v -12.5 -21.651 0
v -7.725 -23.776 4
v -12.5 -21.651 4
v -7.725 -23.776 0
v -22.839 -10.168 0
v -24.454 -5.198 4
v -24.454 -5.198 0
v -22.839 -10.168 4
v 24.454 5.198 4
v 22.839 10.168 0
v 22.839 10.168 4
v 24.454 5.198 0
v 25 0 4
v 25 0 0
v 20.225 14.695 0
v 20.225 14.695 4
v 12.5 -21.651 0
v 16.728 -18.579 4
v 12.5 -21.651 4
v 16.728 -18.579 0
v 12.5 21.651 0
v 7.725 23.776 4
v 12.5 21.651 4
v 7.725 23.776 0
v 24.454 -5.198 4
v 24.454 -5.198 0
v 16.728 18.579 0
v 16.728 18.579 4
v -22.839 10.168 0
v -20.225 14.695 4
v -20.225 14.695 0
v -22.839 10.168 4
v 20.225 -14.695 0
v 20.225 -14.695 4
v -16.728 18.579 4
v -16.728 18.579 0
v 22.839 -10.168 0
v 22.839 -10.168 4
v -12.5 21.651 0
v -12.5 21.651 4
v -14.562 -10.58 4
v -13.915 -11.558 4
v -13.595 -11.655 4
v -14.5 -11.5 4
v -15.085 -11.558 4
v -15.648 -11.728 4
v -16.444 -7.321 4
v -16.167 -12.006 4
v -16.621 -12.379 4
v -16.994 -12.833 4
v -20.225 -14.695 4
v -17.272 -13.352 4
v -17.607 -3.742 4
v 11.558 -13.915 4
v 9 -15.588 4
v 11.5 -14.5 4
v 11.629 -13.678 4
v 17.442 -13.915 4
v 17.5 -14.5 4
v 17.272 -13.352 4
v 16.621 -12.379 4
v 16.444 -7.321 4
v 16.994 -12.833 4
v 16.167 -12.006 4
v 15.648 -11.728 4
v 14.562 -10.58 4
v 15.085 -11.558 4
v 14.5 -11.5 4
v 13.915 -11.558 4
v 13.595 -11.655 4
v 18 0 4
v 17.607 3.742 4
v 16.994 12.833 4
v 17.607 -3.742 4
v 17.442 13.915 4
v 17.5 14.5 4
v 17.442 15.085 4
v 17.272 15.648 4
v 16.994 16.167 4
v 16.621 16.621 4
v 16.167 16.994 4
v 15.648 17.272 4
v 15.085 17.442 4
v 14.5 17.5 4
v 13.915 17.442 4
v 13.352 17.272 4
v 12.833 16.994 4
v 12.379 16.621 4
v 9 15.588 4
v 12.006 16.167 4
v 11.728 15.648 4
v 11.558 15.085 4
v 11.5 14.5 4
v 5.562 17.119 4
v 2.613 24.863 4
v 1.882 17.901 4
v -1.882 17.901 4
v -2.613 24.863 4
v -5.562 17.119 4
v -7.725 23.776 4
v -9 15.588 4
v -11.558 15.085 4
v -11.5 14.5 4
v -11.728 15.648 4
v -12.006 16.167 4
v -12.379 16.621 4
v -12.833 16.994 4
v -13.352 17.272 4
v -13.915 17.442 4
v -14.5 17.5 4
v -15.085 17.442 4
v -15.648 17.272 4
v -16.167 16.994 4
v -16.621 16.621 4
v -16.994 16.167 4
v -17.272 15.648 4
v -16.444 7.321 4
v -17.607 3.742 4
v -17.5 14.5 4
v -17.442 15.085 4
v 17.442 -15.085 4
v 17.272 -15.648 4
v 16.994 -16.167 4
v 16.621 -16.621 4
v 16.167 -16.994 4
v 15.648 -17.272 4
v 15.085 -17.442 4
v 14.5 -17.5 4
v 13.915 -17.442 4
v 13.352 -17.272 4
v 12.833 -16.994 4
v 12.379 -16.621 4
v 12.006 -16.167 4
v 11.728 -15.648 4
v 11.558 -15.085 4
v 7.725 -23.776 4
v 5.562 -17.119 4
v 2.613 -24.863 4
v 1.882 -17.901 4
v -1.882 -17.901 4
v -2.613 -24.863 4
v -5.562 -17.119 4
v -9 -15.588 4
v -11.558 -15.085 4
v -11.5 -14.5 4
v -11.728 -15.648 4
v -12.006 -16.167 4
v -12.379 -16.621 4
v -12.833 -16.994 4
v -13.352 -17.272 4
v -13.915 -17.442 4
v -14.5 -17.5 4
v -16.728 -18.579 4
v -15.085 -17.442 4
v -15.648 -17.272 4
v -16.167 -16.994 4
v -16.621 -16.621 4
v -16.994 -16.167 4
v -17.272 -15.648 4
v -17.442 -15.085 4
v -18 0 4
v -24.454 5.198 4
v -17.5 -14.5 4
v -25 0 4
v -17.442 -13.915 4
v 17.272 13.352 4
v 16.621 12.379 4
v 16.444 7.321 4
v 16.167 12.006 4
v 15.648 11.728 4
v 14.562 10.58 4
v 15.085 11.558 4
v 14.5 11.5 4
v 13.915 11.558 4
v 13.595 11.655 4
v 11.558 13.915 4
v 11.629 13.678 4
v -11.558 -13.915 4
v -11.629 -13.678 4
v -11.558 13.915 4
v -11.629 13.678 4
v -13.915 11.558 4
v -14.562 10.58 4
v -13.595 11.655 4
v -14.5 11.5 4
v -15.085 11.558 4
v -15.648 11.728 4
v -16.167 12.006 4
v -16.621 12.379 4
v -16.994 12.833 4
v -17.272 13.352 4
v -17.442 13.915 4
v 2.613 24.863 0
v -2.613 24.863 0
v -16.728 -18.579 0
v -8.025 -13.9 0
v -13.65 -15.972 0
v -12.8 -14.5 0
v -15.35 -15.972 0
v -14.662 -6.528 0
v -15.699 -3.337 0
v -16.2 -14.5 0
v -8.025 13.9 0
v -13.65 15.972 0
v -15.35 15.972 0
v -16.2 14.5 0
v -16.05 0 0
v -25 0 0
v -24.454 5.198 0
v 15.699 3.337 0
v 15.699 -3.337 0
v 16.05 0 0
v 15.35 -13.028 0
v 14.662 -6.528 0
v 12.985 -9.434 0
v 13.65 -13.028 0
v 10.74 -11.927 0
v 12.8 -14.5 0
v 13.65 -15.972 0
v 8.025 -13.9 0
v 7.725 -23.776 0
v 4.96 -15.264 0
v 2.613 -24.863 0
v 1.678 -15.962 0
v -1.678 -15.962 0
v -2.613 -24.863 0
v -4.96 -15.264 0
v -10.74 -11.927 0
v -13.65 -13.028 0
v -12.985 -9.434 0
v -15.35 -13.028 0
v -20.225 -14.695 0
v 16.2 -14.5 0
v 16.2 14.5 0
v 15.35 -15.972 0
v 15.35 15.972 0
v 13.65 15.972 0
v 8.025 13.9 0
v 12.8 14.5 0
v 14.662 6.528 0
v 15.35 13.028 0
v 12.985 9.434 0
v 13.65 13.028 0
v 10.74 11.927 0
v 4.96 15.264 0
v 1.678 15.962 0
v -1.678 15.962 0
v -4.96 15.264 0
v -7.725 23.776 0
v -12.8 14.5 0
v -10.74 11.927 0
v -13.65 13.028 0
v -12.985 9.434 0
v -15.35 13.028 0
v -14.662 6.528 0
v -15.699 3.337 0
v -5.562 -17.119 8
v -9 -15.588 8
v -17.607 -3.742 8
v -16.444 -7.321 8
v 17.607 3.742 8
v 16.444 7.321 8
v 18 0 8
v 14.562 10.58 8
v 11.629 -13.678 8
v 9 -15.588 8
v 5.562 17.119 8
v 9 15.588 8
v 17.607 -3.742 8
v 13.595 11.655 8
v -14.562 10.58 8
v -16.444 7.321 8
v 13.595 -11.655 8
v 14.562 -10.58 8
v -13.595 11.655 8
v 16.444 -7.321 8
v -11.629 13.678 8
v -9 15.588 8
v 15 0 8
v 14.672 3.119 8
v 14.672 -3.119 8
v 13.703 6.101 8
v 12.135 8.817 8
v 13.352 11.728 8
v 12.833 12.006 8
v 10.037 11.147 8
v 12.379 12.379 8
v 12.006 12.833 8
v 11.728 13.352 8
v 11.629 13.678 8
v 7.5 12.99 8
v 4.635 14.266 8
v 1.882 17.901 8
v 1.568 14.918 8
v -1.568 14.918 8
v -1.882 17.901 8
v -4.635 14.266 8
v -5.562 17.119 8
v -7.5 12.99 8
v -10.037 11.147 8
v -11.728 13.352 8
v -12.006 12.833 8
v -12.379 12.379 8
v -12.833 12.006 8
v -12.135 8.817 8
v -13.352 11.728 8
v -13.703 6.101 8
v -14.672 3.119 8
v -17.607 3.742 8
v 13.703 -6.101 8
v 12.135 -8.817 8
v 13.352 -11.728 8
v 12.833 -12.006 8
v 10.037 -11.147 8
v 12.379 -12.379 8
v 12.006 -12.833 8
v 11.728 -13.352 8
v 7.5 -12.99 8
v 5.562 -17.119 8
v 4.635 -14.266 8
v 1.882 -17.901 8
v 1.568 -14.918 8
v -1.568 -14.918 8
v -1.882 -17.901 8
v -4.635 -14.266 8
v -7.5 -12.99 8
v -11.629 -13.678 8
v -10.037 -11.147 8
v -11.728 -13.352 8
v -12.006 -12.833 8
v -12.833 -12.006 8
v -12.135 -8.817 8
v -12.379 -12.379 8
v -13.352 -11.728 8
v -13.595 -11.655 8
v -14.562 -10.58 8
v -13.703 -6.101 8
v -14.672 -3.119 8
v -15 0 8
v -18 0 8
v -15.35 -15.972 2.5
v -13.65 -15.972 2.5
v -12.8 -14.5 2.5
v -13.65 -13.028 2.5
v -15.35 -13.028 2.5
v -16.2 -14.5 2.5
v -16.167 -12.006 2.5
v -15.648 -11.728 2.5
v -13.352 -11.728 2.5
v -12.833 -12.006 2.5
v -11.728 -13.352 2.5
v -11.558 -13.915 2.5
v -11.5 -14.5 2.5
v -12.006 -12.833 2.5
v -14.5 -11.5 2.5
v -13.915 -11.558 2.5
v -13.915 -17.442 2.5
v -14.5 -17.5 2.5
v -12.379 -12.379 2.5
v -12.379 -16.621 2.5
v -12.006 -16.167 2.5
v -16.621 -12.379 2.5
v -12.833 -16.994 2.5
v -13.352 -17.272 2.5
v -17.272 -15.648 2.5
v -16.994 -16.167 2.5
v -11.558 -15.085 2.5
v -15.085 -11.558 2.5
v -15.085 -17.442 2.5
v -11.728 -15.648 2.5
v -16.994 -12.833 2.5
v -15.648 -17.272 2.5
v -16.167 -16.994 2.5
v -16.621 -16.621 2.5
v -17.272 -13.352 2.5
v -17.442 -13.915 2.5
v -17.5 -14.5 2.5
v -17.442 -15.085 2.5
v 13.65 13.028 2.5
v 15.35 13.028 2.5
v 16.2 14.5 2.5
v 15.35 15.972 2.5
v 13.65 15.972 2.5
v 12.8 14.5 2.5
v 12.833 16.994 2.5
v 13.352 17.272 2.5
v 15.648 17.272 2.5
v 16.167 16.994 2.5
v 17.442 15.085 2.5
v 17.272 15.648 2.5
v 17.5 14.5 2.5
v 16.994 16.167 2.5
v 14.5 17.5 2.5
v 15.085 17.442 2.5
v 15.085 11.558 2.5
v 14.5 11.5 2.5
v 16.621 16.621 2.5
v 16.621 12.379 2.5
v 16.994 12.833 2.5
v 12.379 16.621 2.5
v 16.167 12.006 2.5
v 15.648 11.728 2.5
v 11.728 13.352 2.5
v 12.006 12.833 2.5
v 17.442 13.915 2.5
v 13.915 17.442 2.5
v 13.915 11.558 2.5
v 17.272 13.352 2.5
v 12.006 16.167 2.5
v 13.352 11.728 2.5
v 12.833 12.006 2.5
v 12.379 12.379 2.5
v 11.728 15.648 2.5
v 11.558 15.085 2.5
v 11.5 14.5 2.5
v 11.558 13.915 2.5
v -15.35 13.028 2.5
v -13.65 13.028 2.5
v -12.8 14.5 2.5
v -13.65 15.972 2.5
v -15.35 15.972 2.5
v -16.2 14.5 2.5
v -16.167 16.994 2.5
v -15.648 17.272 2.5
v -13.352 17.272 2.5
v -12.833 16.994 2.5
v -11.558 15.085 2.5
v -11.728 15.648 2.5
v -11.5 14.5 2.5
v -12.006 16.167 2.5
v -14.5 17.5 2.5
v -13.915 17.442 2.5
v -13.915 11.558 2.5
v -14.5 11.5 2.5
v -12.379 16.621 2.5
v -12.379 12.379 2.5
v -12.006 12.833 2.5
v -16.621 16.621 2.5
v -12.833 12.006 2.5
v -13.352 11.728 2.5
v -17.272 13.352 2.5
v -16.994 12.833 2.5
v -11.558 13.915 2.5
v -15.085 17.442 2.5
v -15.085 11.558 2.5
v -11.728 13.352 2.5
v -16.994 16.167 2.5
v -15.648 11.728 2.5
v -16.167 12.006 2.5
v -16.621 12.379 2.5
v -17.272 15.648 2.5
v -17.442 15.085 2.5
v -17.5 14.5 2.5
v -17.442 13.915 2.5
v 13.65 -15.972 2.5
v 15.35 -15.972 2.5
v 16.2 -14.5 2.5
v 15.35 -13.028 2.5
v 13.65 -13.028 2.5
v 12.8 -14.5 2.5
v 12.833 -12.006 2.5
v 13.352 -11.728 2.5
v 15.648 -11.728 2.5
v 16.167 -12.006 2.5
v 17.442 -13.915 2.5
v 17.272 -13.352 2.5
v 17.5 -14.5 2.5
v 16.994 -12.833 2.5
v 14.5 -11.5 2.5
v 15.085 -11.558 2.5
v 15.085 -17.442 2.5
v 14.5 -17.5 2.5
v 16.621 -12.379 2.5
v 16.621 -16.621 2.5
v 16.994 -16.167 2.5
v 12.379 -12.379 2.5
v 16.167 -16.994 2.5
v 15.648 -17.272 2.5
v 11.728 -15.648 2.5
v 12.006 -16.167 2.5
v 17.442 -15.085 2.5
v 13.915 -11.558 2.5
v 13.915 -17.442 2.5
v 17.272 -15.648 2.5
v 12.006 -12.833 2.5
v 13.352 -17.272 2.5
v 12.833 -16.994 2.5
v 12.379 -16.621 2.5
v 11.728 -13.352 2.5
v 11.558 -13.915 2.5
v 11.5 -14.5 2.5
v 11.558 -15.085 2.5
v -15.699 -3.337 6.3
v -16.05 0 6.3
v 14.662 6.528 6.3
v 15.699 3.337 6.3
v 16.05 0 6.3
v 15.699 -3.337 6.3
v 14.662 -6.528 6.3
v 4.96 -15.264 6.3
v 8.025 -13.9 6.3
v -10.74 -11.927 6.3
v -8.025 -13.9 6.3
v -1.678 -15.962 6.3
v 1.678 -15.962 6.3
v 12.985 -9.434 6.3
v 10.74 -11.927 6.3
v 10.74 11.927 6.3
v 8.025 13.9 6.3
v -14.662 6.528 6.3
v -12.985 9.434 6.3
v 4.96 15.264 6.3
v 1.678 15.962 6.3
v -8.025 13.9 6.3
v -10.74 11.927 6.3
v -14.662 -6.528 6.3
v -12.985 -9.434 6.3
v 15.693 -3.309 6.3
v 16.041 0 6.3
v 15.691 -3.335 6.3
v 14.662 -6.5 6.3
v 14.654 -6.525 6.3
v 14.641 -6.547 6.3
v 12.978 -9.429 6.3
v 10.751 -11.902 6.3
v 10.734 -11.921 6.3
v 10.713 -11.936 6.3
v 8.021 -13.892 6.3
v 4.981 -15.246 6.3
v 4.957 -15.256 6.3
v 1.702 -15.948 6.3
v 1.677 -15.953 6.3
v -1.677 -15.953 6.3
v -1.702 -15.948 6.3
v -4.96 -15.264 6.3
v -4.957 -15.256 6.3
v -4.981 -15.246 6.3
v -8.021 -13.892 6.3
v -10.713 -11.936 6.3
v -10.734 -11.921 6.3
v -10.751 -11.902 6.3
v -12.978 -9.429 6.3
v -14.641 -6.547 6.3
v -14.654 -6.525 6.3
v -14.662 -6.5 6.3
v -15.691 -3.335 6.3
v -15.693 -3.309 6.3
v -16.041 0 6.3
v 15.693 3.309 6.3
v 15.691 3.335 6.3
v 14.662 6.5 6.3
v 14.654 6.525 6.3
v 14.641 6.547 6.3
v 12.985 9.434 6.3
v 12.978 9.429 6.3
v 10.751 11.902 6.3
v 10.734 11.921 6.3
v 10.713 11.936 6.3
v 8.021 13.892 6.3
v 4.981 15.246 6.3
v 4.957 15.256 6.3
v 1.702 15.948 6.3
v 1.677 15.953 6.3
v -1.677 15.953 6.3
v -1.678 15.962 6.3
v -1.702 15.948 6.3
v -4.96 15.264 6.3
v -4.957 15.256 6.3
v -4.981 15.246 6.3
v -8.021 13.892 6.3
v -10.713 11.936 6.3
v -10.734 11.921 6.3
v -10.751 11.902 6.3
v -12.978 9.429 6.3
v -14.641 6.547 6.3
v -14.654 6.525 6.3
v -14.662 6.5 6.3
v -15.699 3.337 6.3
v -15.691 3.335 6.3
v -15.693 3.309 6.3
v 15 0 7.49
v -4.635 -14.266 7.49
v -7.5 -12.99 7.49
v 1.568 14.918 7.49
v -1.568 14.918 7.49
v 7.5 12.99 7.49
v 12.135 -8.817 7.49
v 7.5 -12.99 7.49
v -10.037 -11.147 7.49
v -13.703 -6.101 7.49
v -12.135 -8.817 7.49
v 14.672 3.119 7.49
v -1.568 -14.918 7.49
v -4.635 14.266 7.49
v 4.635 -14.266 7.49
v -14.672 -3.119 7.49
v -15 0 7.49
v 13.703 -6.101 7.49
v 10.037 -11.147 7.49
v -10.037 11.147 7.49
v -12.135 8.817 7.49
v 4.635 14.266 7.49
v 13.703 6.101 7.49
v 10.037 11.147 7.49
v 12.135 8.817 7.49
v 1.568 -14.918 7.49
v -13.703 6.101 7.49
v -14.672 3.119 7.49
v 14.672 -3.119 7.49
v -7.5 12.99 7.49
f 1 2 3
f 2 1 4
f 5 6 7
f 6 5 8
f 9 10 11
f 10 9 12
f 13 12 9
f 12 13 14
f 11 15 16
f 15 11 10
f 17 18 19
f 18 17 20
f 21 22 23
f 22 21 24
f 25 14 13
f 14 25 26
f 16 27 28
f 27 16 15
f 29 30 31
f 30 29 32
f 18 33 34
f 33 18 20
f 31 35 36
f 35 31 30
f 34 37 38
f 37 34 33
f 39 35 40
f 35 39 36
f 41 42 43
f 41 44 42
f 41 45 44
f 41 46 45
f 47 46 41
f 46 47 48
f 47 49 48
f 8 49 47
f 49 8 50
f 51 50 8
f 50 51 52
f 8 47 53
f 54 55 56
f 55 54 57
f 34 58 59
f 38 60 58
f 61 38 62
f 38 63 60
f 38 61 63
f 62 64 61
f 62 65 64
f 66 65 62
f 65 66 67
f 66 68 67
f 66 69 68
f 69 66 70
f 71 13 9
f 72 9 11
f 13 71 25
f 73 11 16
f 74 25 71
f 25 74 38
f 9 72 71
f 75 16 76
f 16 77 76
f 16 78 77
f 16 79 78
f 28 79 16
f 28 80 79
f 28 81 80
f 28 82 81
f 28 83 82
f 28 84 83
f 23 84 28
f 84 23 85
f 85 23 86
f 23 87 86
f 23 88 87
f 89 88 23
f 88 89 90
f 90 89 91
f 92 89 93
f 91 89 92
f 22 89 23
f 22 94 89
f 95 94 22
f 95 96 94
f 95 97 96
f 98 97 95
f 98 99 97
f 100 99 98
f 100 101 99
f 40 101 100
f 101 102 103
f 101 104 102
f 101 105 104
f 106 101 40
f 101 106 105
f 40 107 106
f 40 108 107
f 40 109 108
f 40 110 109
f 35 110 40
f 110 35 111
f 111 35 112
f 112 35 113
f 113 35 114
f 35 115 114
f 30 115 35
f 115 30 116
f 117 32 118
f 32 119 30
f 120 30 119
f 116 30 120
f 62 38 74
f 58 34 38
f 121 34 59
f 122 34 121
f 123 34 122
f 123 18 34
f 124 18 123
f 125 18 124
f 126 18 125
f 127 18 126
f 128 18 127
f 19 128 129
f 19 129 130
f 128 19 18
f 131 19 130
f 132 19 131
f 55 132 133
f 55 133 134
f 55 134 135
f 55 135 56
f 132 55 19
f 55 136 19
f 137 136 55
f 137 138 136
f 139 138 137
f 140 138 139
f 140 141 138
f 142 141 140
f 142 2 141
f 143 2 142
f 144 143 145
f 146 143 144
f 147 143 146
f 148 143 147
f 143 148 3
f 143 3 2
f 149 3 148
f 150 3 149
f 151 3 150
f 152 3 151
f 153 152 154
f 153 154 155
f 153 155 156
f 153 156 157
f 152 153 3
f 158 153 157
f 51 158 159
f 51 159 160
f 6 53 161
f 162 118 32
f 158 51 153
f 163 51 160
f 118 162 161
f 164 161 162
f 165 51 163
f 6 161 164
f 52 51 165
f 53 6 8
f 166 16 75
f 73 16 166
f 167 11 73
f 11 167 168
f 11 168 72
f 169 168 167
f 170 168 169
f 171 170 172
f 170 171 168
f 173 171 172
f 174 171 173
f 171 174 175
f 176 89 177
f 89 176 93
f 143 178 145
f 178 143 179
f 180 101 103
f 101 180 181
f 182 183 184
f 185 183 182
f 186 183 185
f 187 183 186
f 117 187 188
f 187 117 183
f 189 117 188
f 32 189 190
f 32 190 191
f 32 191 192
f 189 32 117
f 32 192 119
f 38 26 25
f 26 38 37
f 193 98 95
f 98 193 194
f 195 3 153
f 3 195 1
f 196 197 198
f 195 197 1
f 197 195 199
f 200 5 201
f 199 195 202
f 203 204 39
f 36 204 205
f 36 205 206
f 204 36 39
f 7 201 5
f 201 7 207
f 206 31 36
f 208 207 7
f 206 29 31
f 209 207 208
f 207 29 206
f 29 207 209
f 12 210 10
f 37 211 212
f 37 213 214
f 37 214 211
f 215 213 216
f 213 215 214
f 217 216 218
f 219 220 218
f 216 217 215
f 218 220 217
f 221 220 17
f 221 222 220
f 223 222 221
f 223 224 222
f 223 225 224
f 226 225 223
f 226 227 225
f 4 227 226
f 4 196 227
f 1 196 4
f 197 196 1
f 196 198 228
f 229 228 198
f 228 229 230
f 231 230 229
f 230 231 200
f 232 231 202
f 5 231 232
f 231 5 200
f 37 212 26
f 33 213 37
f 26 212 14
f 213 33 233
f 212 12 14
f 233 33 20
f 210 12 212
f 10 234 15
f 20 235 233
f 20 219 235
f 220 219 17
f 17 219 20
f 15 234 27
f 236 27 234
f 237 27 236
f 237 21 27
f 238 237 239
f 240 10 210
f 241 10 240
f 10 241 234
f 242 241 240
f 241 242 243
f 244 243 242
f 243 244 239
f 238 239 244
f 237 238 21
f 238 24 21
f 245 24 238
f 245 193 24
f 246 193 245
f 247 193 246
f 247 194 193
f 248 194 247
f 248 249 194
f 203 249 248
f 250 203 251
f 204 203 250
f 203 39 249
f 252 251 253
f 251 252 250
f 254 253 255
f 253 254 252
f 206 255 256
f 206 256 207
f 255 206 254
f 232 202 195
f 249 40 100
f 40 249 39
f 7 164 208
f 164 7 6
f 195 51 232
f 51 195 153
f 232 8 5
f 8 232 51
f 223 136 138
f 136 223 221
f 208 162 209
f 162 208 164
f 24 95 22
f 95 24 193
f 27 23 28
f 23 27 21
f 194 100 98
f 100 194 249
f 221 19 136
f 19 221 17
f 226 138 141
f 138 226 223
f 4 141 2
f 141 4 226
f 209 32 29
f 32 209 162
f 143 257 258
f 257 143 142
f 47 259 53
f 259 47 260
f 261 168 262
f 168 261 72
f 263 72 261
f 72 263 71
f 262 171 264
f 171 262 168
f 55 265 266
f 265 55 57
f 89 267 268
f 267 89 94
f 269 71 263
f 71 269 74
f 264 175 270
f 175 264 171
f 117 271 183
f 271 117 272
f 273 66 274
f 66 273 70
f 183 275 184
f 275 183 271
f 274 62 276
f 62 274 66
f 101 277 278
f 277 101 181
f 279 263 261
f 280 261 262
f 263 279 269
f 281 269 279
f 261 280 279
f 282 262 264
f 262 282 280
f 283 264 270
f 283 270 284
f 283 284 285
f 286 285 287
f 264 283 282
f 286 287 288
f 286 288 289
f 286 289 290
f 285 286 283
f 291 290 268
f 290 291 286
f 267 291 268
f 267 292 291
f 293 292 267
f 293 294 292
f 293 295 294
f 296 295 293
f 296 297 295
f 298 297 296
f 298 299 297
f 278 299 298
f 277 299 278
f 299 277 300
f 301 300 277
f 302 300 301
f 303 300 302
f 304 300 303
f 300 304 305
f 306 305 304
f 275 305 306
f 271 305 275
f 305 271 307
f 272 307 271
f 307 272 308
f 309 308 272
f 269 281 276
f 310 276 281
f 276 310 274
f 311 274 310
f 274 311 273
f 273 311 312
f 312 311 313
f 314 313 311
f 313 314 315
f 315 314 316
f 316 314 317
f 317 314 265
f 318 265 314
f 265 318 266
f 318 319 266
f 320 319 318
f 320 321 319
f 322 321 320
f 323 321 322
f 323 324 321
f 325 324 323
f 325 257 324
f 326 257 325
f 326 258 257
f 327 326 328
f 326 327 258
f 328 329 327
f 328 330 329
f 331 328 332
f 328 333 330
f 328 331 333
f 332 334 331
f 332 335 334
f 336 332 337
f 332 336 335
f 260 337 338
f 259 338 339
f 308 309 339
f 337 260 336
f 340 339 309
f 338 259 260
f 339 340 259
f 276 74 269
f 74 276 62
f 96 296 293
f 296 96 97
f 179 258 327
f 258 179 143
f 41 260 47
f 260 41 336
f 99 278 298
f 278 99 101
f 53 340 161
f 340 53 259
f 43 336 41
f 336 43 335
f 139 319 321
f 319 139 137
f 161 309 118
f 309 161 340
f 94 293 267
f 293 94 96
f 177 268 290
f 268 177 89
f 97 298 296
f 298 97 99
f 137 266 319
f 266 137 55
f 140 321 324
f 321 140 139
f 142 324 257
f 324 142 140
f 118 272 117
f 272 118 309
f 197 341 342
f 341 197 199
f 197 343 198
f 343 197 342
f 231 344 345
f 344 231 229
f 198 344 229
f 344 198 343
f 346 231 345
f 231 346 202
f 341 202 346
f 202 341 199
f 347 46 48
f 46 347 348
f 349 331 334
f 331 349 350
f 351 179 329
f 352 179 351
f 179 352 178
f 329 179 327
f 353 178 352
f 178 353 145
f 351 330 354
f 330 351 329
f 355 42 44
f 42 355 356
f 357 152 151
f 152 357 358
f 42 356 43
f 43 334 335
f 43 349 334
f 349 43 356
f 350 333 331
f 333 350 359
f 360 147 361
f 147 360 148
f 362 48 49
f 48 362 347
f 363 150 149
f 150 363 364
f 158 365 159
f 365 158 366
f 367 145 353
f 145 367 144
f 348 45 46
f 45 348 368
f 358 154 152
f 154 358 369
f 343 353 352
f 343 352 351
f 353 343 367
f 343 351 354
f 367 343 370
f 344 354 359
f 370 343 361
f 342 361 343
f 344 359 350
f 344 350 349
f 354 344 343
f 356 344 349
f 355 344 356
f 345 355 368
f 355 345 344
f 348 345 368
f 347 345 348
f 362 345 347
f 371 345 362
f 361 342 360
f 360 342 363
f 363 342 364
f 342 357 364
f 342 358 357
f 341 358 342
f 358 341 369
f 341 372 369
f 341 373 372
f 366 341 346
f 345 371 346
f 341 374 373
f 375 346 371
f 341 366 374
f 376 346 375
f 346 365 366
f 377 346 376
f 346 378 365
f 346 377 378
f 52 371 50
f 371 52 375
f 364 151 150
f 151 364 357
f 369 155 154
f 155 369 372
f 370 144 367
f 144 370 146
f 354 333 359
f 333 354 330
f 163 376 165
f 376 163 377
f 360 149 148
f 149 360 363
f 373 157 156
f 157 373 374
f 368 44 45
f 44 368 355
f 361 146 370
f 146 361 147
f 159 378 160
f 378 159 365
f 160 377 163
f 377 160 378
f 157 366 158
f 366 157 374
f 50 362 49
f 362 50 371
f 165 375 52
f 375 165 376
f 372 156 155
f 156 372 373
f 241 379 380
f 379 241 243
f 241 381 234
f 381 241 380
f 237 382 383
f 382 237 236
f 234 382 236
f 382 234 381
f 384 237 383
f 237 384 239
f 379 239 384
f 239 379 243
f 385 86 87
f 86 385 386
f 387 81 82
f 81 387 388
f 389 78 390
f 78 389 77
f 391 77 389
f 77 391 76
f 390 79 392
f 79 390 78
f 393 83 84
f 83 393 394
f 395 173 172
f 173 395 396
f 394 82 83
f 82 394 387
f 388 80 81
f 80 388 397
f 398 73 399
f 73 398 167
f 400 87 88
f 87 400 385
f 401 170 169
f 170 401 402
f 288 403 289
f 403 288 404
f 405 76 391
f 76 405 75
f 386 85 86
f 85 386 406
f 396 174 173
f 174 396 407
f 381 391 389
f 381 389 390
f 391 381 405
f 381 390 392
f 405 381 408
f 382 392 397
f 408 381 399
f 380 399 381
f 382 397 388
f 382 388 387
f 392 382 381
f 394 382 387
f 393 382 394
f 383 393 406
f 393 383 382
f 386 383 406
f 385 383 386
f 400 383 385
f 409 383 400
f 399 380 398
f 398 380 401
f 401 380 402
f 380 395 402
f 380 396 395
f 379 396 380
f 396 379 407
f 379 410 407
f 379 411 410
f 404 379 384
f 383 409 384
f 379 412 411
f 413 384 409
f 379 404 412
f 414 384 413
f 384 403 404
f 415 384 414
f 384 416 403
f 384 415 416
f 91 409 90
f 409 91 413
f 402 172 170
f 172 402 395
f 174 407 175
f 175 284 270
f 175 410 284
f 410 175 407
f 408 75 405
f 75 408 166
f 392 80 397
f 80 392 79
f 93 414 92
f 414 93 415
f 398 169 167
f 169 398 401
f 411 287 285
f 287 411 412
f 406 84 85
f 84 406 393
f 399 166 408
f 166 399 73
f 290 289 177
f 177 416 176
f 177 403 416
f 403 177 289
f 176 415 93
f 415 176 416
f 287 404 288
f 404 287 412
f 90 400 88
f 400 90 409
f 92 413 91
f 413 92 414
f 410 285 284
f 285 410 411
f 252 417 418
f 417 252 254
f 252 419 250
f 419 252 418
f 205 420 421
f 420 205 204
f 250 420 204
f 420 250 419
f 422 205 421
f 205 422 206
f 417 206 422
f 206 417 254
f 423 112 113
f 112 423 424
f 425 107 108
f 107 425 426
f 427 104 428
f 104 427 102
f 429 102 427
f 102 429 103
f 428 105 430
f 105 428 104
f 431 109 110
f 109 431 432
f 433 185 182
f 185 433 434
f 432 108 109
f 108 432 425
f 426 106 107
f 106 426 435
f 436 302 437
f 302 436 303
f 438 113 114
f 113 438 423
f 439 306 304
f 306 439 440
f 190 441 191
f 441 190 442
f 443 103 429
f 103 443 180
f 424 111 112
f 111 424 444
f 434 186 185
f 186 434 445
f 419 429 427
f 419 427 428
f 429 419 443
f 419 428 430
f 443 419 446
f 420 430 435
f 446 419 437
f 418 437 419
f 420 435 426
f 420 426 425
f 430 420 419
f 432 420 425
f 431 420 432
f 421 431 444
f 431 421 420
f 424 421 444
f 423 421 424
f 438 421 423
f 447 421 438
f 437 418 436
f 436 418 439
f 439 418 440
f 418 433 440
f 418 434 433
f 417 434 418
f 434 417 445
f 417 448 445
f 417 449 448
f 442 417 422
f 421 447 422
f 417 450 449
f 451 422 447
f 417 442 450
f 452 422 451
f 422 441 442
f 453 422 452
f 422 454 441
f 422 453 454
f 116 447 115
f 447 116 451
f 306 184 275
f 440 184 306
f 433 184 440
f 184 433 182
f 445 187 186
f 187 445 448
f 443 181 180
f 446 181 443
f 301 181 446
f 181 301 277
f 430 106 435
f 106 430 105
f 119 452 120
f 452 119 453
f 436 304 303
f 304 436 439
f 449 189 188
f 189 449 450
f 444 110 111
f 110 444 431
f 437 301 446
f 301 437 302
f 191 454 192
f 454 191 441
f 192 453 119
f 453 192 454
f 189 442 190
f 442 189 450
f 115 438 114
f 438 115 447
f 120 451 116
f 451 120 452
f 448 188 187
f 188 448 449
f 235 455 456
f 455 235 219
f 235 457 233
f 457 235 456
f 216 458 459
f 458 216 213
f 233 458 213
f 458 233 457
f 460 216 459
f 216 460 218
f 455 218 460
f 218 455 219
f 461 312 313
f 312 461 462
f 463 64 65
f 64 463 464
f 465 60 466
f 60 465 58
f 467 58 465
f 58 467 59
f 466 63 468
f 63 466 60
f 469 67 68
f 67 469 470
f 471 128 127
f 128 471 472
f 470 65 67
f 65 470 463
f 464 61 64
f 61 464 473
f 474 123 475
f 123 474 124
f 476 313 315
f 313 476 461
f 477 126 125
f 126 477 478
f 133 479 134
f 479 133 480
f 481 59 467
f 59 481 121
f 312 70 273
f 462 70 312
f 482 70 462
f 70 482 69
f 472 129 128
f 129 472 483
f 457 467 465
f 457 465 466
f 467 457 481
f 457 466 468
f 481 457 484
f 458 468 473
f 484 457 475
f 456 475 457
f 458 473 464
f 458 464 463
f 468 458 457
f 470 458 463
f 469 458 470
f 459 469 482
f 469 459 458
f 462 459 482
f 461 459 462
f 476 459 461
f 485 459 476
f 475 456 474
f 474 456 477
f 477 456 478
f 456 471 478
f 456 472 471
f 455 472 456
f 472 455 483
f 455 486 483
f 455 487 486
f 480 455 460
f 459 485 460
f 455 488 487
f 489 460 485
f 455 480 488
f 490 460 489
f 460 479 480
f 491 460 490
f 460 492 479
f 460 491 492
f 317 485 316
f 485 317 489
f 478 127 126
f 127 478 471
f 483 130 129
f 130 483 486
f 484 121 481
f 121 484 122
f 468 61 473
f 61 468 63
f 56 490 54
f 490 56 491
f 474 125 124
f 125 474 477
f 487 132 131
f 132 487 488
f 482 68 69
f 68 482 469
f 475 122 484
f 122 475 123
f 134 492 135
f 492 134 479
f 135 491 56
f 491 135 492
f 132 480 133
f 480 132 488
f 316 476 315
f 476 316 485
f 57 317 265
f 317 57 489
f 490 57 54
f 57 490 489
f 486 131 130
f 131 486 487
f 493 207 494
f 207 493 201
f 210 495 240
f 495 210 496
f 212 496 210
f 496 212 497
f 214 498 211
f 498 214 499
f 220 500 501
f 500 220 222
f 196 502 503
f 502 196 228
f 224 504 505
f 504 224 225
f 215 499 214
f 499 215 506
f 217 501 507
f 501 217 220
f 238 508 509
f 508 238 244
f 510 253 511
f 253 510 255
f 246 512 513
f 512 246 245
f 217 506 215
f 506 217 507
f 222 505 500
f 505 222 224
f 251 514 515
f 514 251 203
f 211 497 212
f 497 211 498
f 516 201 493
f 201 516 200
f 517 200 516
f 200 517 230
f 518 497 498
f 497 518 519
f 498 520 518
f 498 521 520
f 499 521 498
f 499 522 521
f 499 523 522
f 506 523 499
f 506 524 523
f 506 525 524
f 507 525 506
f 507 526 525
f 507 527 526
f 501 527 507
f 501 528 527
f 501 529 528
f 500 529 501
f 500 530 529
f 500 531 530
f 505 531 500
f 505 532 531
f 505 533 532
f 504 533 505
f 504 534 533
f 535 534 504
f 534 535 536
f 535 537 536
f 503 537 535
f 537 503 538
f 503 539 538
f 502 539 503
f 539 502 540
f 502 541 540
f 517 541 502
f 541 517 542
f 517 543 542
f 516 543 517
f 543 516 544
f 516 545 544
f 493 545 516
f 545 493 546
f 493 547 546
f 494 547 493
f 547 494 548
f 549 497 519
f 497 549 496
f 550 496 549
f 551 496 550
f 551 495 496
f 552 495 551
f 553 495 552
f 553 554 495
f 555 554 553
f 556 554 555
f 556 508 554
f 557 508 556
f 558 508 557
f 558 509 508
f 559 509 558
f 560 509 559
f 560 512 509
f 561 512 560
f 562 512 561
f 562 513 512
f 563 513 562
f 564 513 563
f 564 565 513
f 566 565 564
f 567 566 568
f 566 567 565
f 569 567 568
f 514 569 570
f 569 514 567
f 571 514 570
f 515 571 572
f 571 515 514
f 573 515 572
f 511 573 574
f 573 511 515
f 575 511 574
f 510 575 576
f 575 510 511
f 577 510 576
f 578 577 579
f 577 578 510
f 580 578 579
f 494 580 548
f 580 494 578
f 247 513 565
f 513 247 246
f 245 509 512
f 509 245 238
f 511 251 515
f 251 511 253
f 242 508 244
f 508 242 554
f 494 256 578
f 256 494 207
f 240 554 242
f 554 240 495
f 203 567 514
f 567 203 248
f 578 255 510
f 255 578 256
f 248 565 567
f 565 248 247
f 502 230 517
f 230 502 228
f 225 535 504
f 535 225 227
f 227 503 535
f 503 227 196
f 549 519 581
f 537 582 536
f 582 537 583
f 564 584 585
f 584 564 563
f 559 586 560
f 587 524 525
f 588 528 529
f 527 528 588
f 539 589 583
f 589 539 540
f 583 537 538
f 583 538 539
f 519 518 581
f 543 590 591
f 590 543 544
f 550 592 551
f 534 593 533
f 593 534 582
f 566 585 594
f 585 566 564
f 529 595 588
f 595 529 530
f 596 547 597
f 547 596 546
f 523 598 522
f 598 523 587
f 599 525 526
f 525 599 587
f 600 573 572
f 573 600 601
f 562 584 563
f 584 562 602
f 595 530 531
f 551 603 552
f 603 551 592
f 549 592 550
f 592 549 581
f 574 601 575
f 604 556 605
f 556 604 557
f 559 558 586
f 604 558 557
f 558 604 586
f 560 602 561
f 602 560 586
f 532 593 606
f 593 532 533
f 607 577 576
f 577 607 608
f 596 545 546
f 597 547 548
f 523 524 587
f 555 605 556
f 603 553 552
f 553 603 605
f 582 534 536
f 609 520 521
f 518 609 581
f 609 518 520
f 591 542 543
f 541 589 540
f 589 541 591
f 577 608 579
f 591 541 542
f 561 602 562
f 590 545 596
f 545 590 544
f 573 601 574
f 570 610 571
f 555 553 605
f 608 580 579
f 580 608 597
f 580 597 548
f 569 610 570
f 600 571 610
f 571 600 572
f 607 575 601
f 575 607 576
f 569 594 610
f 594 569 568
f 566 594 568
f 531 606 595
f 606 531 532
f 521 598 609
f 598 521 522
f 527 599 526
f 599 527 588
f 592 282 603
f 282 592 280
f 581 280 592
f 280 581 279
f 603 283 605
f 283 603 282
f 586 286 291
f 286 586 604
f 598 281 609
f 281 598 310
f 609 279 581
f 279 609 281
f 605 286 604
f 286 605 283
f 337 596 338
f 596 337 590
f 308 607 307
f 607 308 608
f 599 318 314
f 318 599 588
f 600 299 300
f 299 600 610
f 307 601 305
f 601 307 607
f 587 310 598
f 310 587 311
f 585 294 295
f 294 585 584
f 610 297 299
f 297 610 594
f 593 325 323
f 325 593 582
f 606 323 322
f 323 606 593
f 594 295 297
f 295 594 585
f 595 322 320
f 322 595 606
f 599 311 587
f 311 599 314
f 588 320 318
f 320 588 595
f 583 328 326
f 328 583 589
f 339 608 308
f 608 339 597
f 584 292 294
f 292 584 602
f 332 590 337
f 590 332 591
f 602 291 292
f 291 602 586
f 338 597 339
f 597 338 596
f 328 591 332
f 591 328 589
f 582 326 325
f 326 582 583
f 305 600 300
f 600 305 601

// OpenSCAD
seat6804();

module seat6804() {
  difference($fn=256) {
    union() {
      cylinder(d=50,h=4); // brim
      cylinder(d=36,h=8);
    }
    translate([0,0,-1]) cylinder(d=32.1,h=7.3); // bearing
    translate([0,0,6.29]) cylinder(d1=32.1,d2=30,h=1.2); // limiter
    translate([0,0,-1.2]) cylinder(d=30,h=20); // limiter
    screws();
  }
  *%nsk6804();
}


module screws() {
  screw([-14.5,-14.5]);
  screw([14.5,14.5]);
  screw([-14.5,14.5]);
  screw([14.5,-14.5]);
}

module screw(pos) {
  translate(pos) {
    translate([0,0,-1]) cylinder(d=3.4,h=11);
    translate([0,0,2.5]) cylinder(d=6,h=11,$fn=32);
  }
}

module nsk6804() {
  rotate([0,90,0]) resize([7,32,32]) import("nsk6804.stl");
}
